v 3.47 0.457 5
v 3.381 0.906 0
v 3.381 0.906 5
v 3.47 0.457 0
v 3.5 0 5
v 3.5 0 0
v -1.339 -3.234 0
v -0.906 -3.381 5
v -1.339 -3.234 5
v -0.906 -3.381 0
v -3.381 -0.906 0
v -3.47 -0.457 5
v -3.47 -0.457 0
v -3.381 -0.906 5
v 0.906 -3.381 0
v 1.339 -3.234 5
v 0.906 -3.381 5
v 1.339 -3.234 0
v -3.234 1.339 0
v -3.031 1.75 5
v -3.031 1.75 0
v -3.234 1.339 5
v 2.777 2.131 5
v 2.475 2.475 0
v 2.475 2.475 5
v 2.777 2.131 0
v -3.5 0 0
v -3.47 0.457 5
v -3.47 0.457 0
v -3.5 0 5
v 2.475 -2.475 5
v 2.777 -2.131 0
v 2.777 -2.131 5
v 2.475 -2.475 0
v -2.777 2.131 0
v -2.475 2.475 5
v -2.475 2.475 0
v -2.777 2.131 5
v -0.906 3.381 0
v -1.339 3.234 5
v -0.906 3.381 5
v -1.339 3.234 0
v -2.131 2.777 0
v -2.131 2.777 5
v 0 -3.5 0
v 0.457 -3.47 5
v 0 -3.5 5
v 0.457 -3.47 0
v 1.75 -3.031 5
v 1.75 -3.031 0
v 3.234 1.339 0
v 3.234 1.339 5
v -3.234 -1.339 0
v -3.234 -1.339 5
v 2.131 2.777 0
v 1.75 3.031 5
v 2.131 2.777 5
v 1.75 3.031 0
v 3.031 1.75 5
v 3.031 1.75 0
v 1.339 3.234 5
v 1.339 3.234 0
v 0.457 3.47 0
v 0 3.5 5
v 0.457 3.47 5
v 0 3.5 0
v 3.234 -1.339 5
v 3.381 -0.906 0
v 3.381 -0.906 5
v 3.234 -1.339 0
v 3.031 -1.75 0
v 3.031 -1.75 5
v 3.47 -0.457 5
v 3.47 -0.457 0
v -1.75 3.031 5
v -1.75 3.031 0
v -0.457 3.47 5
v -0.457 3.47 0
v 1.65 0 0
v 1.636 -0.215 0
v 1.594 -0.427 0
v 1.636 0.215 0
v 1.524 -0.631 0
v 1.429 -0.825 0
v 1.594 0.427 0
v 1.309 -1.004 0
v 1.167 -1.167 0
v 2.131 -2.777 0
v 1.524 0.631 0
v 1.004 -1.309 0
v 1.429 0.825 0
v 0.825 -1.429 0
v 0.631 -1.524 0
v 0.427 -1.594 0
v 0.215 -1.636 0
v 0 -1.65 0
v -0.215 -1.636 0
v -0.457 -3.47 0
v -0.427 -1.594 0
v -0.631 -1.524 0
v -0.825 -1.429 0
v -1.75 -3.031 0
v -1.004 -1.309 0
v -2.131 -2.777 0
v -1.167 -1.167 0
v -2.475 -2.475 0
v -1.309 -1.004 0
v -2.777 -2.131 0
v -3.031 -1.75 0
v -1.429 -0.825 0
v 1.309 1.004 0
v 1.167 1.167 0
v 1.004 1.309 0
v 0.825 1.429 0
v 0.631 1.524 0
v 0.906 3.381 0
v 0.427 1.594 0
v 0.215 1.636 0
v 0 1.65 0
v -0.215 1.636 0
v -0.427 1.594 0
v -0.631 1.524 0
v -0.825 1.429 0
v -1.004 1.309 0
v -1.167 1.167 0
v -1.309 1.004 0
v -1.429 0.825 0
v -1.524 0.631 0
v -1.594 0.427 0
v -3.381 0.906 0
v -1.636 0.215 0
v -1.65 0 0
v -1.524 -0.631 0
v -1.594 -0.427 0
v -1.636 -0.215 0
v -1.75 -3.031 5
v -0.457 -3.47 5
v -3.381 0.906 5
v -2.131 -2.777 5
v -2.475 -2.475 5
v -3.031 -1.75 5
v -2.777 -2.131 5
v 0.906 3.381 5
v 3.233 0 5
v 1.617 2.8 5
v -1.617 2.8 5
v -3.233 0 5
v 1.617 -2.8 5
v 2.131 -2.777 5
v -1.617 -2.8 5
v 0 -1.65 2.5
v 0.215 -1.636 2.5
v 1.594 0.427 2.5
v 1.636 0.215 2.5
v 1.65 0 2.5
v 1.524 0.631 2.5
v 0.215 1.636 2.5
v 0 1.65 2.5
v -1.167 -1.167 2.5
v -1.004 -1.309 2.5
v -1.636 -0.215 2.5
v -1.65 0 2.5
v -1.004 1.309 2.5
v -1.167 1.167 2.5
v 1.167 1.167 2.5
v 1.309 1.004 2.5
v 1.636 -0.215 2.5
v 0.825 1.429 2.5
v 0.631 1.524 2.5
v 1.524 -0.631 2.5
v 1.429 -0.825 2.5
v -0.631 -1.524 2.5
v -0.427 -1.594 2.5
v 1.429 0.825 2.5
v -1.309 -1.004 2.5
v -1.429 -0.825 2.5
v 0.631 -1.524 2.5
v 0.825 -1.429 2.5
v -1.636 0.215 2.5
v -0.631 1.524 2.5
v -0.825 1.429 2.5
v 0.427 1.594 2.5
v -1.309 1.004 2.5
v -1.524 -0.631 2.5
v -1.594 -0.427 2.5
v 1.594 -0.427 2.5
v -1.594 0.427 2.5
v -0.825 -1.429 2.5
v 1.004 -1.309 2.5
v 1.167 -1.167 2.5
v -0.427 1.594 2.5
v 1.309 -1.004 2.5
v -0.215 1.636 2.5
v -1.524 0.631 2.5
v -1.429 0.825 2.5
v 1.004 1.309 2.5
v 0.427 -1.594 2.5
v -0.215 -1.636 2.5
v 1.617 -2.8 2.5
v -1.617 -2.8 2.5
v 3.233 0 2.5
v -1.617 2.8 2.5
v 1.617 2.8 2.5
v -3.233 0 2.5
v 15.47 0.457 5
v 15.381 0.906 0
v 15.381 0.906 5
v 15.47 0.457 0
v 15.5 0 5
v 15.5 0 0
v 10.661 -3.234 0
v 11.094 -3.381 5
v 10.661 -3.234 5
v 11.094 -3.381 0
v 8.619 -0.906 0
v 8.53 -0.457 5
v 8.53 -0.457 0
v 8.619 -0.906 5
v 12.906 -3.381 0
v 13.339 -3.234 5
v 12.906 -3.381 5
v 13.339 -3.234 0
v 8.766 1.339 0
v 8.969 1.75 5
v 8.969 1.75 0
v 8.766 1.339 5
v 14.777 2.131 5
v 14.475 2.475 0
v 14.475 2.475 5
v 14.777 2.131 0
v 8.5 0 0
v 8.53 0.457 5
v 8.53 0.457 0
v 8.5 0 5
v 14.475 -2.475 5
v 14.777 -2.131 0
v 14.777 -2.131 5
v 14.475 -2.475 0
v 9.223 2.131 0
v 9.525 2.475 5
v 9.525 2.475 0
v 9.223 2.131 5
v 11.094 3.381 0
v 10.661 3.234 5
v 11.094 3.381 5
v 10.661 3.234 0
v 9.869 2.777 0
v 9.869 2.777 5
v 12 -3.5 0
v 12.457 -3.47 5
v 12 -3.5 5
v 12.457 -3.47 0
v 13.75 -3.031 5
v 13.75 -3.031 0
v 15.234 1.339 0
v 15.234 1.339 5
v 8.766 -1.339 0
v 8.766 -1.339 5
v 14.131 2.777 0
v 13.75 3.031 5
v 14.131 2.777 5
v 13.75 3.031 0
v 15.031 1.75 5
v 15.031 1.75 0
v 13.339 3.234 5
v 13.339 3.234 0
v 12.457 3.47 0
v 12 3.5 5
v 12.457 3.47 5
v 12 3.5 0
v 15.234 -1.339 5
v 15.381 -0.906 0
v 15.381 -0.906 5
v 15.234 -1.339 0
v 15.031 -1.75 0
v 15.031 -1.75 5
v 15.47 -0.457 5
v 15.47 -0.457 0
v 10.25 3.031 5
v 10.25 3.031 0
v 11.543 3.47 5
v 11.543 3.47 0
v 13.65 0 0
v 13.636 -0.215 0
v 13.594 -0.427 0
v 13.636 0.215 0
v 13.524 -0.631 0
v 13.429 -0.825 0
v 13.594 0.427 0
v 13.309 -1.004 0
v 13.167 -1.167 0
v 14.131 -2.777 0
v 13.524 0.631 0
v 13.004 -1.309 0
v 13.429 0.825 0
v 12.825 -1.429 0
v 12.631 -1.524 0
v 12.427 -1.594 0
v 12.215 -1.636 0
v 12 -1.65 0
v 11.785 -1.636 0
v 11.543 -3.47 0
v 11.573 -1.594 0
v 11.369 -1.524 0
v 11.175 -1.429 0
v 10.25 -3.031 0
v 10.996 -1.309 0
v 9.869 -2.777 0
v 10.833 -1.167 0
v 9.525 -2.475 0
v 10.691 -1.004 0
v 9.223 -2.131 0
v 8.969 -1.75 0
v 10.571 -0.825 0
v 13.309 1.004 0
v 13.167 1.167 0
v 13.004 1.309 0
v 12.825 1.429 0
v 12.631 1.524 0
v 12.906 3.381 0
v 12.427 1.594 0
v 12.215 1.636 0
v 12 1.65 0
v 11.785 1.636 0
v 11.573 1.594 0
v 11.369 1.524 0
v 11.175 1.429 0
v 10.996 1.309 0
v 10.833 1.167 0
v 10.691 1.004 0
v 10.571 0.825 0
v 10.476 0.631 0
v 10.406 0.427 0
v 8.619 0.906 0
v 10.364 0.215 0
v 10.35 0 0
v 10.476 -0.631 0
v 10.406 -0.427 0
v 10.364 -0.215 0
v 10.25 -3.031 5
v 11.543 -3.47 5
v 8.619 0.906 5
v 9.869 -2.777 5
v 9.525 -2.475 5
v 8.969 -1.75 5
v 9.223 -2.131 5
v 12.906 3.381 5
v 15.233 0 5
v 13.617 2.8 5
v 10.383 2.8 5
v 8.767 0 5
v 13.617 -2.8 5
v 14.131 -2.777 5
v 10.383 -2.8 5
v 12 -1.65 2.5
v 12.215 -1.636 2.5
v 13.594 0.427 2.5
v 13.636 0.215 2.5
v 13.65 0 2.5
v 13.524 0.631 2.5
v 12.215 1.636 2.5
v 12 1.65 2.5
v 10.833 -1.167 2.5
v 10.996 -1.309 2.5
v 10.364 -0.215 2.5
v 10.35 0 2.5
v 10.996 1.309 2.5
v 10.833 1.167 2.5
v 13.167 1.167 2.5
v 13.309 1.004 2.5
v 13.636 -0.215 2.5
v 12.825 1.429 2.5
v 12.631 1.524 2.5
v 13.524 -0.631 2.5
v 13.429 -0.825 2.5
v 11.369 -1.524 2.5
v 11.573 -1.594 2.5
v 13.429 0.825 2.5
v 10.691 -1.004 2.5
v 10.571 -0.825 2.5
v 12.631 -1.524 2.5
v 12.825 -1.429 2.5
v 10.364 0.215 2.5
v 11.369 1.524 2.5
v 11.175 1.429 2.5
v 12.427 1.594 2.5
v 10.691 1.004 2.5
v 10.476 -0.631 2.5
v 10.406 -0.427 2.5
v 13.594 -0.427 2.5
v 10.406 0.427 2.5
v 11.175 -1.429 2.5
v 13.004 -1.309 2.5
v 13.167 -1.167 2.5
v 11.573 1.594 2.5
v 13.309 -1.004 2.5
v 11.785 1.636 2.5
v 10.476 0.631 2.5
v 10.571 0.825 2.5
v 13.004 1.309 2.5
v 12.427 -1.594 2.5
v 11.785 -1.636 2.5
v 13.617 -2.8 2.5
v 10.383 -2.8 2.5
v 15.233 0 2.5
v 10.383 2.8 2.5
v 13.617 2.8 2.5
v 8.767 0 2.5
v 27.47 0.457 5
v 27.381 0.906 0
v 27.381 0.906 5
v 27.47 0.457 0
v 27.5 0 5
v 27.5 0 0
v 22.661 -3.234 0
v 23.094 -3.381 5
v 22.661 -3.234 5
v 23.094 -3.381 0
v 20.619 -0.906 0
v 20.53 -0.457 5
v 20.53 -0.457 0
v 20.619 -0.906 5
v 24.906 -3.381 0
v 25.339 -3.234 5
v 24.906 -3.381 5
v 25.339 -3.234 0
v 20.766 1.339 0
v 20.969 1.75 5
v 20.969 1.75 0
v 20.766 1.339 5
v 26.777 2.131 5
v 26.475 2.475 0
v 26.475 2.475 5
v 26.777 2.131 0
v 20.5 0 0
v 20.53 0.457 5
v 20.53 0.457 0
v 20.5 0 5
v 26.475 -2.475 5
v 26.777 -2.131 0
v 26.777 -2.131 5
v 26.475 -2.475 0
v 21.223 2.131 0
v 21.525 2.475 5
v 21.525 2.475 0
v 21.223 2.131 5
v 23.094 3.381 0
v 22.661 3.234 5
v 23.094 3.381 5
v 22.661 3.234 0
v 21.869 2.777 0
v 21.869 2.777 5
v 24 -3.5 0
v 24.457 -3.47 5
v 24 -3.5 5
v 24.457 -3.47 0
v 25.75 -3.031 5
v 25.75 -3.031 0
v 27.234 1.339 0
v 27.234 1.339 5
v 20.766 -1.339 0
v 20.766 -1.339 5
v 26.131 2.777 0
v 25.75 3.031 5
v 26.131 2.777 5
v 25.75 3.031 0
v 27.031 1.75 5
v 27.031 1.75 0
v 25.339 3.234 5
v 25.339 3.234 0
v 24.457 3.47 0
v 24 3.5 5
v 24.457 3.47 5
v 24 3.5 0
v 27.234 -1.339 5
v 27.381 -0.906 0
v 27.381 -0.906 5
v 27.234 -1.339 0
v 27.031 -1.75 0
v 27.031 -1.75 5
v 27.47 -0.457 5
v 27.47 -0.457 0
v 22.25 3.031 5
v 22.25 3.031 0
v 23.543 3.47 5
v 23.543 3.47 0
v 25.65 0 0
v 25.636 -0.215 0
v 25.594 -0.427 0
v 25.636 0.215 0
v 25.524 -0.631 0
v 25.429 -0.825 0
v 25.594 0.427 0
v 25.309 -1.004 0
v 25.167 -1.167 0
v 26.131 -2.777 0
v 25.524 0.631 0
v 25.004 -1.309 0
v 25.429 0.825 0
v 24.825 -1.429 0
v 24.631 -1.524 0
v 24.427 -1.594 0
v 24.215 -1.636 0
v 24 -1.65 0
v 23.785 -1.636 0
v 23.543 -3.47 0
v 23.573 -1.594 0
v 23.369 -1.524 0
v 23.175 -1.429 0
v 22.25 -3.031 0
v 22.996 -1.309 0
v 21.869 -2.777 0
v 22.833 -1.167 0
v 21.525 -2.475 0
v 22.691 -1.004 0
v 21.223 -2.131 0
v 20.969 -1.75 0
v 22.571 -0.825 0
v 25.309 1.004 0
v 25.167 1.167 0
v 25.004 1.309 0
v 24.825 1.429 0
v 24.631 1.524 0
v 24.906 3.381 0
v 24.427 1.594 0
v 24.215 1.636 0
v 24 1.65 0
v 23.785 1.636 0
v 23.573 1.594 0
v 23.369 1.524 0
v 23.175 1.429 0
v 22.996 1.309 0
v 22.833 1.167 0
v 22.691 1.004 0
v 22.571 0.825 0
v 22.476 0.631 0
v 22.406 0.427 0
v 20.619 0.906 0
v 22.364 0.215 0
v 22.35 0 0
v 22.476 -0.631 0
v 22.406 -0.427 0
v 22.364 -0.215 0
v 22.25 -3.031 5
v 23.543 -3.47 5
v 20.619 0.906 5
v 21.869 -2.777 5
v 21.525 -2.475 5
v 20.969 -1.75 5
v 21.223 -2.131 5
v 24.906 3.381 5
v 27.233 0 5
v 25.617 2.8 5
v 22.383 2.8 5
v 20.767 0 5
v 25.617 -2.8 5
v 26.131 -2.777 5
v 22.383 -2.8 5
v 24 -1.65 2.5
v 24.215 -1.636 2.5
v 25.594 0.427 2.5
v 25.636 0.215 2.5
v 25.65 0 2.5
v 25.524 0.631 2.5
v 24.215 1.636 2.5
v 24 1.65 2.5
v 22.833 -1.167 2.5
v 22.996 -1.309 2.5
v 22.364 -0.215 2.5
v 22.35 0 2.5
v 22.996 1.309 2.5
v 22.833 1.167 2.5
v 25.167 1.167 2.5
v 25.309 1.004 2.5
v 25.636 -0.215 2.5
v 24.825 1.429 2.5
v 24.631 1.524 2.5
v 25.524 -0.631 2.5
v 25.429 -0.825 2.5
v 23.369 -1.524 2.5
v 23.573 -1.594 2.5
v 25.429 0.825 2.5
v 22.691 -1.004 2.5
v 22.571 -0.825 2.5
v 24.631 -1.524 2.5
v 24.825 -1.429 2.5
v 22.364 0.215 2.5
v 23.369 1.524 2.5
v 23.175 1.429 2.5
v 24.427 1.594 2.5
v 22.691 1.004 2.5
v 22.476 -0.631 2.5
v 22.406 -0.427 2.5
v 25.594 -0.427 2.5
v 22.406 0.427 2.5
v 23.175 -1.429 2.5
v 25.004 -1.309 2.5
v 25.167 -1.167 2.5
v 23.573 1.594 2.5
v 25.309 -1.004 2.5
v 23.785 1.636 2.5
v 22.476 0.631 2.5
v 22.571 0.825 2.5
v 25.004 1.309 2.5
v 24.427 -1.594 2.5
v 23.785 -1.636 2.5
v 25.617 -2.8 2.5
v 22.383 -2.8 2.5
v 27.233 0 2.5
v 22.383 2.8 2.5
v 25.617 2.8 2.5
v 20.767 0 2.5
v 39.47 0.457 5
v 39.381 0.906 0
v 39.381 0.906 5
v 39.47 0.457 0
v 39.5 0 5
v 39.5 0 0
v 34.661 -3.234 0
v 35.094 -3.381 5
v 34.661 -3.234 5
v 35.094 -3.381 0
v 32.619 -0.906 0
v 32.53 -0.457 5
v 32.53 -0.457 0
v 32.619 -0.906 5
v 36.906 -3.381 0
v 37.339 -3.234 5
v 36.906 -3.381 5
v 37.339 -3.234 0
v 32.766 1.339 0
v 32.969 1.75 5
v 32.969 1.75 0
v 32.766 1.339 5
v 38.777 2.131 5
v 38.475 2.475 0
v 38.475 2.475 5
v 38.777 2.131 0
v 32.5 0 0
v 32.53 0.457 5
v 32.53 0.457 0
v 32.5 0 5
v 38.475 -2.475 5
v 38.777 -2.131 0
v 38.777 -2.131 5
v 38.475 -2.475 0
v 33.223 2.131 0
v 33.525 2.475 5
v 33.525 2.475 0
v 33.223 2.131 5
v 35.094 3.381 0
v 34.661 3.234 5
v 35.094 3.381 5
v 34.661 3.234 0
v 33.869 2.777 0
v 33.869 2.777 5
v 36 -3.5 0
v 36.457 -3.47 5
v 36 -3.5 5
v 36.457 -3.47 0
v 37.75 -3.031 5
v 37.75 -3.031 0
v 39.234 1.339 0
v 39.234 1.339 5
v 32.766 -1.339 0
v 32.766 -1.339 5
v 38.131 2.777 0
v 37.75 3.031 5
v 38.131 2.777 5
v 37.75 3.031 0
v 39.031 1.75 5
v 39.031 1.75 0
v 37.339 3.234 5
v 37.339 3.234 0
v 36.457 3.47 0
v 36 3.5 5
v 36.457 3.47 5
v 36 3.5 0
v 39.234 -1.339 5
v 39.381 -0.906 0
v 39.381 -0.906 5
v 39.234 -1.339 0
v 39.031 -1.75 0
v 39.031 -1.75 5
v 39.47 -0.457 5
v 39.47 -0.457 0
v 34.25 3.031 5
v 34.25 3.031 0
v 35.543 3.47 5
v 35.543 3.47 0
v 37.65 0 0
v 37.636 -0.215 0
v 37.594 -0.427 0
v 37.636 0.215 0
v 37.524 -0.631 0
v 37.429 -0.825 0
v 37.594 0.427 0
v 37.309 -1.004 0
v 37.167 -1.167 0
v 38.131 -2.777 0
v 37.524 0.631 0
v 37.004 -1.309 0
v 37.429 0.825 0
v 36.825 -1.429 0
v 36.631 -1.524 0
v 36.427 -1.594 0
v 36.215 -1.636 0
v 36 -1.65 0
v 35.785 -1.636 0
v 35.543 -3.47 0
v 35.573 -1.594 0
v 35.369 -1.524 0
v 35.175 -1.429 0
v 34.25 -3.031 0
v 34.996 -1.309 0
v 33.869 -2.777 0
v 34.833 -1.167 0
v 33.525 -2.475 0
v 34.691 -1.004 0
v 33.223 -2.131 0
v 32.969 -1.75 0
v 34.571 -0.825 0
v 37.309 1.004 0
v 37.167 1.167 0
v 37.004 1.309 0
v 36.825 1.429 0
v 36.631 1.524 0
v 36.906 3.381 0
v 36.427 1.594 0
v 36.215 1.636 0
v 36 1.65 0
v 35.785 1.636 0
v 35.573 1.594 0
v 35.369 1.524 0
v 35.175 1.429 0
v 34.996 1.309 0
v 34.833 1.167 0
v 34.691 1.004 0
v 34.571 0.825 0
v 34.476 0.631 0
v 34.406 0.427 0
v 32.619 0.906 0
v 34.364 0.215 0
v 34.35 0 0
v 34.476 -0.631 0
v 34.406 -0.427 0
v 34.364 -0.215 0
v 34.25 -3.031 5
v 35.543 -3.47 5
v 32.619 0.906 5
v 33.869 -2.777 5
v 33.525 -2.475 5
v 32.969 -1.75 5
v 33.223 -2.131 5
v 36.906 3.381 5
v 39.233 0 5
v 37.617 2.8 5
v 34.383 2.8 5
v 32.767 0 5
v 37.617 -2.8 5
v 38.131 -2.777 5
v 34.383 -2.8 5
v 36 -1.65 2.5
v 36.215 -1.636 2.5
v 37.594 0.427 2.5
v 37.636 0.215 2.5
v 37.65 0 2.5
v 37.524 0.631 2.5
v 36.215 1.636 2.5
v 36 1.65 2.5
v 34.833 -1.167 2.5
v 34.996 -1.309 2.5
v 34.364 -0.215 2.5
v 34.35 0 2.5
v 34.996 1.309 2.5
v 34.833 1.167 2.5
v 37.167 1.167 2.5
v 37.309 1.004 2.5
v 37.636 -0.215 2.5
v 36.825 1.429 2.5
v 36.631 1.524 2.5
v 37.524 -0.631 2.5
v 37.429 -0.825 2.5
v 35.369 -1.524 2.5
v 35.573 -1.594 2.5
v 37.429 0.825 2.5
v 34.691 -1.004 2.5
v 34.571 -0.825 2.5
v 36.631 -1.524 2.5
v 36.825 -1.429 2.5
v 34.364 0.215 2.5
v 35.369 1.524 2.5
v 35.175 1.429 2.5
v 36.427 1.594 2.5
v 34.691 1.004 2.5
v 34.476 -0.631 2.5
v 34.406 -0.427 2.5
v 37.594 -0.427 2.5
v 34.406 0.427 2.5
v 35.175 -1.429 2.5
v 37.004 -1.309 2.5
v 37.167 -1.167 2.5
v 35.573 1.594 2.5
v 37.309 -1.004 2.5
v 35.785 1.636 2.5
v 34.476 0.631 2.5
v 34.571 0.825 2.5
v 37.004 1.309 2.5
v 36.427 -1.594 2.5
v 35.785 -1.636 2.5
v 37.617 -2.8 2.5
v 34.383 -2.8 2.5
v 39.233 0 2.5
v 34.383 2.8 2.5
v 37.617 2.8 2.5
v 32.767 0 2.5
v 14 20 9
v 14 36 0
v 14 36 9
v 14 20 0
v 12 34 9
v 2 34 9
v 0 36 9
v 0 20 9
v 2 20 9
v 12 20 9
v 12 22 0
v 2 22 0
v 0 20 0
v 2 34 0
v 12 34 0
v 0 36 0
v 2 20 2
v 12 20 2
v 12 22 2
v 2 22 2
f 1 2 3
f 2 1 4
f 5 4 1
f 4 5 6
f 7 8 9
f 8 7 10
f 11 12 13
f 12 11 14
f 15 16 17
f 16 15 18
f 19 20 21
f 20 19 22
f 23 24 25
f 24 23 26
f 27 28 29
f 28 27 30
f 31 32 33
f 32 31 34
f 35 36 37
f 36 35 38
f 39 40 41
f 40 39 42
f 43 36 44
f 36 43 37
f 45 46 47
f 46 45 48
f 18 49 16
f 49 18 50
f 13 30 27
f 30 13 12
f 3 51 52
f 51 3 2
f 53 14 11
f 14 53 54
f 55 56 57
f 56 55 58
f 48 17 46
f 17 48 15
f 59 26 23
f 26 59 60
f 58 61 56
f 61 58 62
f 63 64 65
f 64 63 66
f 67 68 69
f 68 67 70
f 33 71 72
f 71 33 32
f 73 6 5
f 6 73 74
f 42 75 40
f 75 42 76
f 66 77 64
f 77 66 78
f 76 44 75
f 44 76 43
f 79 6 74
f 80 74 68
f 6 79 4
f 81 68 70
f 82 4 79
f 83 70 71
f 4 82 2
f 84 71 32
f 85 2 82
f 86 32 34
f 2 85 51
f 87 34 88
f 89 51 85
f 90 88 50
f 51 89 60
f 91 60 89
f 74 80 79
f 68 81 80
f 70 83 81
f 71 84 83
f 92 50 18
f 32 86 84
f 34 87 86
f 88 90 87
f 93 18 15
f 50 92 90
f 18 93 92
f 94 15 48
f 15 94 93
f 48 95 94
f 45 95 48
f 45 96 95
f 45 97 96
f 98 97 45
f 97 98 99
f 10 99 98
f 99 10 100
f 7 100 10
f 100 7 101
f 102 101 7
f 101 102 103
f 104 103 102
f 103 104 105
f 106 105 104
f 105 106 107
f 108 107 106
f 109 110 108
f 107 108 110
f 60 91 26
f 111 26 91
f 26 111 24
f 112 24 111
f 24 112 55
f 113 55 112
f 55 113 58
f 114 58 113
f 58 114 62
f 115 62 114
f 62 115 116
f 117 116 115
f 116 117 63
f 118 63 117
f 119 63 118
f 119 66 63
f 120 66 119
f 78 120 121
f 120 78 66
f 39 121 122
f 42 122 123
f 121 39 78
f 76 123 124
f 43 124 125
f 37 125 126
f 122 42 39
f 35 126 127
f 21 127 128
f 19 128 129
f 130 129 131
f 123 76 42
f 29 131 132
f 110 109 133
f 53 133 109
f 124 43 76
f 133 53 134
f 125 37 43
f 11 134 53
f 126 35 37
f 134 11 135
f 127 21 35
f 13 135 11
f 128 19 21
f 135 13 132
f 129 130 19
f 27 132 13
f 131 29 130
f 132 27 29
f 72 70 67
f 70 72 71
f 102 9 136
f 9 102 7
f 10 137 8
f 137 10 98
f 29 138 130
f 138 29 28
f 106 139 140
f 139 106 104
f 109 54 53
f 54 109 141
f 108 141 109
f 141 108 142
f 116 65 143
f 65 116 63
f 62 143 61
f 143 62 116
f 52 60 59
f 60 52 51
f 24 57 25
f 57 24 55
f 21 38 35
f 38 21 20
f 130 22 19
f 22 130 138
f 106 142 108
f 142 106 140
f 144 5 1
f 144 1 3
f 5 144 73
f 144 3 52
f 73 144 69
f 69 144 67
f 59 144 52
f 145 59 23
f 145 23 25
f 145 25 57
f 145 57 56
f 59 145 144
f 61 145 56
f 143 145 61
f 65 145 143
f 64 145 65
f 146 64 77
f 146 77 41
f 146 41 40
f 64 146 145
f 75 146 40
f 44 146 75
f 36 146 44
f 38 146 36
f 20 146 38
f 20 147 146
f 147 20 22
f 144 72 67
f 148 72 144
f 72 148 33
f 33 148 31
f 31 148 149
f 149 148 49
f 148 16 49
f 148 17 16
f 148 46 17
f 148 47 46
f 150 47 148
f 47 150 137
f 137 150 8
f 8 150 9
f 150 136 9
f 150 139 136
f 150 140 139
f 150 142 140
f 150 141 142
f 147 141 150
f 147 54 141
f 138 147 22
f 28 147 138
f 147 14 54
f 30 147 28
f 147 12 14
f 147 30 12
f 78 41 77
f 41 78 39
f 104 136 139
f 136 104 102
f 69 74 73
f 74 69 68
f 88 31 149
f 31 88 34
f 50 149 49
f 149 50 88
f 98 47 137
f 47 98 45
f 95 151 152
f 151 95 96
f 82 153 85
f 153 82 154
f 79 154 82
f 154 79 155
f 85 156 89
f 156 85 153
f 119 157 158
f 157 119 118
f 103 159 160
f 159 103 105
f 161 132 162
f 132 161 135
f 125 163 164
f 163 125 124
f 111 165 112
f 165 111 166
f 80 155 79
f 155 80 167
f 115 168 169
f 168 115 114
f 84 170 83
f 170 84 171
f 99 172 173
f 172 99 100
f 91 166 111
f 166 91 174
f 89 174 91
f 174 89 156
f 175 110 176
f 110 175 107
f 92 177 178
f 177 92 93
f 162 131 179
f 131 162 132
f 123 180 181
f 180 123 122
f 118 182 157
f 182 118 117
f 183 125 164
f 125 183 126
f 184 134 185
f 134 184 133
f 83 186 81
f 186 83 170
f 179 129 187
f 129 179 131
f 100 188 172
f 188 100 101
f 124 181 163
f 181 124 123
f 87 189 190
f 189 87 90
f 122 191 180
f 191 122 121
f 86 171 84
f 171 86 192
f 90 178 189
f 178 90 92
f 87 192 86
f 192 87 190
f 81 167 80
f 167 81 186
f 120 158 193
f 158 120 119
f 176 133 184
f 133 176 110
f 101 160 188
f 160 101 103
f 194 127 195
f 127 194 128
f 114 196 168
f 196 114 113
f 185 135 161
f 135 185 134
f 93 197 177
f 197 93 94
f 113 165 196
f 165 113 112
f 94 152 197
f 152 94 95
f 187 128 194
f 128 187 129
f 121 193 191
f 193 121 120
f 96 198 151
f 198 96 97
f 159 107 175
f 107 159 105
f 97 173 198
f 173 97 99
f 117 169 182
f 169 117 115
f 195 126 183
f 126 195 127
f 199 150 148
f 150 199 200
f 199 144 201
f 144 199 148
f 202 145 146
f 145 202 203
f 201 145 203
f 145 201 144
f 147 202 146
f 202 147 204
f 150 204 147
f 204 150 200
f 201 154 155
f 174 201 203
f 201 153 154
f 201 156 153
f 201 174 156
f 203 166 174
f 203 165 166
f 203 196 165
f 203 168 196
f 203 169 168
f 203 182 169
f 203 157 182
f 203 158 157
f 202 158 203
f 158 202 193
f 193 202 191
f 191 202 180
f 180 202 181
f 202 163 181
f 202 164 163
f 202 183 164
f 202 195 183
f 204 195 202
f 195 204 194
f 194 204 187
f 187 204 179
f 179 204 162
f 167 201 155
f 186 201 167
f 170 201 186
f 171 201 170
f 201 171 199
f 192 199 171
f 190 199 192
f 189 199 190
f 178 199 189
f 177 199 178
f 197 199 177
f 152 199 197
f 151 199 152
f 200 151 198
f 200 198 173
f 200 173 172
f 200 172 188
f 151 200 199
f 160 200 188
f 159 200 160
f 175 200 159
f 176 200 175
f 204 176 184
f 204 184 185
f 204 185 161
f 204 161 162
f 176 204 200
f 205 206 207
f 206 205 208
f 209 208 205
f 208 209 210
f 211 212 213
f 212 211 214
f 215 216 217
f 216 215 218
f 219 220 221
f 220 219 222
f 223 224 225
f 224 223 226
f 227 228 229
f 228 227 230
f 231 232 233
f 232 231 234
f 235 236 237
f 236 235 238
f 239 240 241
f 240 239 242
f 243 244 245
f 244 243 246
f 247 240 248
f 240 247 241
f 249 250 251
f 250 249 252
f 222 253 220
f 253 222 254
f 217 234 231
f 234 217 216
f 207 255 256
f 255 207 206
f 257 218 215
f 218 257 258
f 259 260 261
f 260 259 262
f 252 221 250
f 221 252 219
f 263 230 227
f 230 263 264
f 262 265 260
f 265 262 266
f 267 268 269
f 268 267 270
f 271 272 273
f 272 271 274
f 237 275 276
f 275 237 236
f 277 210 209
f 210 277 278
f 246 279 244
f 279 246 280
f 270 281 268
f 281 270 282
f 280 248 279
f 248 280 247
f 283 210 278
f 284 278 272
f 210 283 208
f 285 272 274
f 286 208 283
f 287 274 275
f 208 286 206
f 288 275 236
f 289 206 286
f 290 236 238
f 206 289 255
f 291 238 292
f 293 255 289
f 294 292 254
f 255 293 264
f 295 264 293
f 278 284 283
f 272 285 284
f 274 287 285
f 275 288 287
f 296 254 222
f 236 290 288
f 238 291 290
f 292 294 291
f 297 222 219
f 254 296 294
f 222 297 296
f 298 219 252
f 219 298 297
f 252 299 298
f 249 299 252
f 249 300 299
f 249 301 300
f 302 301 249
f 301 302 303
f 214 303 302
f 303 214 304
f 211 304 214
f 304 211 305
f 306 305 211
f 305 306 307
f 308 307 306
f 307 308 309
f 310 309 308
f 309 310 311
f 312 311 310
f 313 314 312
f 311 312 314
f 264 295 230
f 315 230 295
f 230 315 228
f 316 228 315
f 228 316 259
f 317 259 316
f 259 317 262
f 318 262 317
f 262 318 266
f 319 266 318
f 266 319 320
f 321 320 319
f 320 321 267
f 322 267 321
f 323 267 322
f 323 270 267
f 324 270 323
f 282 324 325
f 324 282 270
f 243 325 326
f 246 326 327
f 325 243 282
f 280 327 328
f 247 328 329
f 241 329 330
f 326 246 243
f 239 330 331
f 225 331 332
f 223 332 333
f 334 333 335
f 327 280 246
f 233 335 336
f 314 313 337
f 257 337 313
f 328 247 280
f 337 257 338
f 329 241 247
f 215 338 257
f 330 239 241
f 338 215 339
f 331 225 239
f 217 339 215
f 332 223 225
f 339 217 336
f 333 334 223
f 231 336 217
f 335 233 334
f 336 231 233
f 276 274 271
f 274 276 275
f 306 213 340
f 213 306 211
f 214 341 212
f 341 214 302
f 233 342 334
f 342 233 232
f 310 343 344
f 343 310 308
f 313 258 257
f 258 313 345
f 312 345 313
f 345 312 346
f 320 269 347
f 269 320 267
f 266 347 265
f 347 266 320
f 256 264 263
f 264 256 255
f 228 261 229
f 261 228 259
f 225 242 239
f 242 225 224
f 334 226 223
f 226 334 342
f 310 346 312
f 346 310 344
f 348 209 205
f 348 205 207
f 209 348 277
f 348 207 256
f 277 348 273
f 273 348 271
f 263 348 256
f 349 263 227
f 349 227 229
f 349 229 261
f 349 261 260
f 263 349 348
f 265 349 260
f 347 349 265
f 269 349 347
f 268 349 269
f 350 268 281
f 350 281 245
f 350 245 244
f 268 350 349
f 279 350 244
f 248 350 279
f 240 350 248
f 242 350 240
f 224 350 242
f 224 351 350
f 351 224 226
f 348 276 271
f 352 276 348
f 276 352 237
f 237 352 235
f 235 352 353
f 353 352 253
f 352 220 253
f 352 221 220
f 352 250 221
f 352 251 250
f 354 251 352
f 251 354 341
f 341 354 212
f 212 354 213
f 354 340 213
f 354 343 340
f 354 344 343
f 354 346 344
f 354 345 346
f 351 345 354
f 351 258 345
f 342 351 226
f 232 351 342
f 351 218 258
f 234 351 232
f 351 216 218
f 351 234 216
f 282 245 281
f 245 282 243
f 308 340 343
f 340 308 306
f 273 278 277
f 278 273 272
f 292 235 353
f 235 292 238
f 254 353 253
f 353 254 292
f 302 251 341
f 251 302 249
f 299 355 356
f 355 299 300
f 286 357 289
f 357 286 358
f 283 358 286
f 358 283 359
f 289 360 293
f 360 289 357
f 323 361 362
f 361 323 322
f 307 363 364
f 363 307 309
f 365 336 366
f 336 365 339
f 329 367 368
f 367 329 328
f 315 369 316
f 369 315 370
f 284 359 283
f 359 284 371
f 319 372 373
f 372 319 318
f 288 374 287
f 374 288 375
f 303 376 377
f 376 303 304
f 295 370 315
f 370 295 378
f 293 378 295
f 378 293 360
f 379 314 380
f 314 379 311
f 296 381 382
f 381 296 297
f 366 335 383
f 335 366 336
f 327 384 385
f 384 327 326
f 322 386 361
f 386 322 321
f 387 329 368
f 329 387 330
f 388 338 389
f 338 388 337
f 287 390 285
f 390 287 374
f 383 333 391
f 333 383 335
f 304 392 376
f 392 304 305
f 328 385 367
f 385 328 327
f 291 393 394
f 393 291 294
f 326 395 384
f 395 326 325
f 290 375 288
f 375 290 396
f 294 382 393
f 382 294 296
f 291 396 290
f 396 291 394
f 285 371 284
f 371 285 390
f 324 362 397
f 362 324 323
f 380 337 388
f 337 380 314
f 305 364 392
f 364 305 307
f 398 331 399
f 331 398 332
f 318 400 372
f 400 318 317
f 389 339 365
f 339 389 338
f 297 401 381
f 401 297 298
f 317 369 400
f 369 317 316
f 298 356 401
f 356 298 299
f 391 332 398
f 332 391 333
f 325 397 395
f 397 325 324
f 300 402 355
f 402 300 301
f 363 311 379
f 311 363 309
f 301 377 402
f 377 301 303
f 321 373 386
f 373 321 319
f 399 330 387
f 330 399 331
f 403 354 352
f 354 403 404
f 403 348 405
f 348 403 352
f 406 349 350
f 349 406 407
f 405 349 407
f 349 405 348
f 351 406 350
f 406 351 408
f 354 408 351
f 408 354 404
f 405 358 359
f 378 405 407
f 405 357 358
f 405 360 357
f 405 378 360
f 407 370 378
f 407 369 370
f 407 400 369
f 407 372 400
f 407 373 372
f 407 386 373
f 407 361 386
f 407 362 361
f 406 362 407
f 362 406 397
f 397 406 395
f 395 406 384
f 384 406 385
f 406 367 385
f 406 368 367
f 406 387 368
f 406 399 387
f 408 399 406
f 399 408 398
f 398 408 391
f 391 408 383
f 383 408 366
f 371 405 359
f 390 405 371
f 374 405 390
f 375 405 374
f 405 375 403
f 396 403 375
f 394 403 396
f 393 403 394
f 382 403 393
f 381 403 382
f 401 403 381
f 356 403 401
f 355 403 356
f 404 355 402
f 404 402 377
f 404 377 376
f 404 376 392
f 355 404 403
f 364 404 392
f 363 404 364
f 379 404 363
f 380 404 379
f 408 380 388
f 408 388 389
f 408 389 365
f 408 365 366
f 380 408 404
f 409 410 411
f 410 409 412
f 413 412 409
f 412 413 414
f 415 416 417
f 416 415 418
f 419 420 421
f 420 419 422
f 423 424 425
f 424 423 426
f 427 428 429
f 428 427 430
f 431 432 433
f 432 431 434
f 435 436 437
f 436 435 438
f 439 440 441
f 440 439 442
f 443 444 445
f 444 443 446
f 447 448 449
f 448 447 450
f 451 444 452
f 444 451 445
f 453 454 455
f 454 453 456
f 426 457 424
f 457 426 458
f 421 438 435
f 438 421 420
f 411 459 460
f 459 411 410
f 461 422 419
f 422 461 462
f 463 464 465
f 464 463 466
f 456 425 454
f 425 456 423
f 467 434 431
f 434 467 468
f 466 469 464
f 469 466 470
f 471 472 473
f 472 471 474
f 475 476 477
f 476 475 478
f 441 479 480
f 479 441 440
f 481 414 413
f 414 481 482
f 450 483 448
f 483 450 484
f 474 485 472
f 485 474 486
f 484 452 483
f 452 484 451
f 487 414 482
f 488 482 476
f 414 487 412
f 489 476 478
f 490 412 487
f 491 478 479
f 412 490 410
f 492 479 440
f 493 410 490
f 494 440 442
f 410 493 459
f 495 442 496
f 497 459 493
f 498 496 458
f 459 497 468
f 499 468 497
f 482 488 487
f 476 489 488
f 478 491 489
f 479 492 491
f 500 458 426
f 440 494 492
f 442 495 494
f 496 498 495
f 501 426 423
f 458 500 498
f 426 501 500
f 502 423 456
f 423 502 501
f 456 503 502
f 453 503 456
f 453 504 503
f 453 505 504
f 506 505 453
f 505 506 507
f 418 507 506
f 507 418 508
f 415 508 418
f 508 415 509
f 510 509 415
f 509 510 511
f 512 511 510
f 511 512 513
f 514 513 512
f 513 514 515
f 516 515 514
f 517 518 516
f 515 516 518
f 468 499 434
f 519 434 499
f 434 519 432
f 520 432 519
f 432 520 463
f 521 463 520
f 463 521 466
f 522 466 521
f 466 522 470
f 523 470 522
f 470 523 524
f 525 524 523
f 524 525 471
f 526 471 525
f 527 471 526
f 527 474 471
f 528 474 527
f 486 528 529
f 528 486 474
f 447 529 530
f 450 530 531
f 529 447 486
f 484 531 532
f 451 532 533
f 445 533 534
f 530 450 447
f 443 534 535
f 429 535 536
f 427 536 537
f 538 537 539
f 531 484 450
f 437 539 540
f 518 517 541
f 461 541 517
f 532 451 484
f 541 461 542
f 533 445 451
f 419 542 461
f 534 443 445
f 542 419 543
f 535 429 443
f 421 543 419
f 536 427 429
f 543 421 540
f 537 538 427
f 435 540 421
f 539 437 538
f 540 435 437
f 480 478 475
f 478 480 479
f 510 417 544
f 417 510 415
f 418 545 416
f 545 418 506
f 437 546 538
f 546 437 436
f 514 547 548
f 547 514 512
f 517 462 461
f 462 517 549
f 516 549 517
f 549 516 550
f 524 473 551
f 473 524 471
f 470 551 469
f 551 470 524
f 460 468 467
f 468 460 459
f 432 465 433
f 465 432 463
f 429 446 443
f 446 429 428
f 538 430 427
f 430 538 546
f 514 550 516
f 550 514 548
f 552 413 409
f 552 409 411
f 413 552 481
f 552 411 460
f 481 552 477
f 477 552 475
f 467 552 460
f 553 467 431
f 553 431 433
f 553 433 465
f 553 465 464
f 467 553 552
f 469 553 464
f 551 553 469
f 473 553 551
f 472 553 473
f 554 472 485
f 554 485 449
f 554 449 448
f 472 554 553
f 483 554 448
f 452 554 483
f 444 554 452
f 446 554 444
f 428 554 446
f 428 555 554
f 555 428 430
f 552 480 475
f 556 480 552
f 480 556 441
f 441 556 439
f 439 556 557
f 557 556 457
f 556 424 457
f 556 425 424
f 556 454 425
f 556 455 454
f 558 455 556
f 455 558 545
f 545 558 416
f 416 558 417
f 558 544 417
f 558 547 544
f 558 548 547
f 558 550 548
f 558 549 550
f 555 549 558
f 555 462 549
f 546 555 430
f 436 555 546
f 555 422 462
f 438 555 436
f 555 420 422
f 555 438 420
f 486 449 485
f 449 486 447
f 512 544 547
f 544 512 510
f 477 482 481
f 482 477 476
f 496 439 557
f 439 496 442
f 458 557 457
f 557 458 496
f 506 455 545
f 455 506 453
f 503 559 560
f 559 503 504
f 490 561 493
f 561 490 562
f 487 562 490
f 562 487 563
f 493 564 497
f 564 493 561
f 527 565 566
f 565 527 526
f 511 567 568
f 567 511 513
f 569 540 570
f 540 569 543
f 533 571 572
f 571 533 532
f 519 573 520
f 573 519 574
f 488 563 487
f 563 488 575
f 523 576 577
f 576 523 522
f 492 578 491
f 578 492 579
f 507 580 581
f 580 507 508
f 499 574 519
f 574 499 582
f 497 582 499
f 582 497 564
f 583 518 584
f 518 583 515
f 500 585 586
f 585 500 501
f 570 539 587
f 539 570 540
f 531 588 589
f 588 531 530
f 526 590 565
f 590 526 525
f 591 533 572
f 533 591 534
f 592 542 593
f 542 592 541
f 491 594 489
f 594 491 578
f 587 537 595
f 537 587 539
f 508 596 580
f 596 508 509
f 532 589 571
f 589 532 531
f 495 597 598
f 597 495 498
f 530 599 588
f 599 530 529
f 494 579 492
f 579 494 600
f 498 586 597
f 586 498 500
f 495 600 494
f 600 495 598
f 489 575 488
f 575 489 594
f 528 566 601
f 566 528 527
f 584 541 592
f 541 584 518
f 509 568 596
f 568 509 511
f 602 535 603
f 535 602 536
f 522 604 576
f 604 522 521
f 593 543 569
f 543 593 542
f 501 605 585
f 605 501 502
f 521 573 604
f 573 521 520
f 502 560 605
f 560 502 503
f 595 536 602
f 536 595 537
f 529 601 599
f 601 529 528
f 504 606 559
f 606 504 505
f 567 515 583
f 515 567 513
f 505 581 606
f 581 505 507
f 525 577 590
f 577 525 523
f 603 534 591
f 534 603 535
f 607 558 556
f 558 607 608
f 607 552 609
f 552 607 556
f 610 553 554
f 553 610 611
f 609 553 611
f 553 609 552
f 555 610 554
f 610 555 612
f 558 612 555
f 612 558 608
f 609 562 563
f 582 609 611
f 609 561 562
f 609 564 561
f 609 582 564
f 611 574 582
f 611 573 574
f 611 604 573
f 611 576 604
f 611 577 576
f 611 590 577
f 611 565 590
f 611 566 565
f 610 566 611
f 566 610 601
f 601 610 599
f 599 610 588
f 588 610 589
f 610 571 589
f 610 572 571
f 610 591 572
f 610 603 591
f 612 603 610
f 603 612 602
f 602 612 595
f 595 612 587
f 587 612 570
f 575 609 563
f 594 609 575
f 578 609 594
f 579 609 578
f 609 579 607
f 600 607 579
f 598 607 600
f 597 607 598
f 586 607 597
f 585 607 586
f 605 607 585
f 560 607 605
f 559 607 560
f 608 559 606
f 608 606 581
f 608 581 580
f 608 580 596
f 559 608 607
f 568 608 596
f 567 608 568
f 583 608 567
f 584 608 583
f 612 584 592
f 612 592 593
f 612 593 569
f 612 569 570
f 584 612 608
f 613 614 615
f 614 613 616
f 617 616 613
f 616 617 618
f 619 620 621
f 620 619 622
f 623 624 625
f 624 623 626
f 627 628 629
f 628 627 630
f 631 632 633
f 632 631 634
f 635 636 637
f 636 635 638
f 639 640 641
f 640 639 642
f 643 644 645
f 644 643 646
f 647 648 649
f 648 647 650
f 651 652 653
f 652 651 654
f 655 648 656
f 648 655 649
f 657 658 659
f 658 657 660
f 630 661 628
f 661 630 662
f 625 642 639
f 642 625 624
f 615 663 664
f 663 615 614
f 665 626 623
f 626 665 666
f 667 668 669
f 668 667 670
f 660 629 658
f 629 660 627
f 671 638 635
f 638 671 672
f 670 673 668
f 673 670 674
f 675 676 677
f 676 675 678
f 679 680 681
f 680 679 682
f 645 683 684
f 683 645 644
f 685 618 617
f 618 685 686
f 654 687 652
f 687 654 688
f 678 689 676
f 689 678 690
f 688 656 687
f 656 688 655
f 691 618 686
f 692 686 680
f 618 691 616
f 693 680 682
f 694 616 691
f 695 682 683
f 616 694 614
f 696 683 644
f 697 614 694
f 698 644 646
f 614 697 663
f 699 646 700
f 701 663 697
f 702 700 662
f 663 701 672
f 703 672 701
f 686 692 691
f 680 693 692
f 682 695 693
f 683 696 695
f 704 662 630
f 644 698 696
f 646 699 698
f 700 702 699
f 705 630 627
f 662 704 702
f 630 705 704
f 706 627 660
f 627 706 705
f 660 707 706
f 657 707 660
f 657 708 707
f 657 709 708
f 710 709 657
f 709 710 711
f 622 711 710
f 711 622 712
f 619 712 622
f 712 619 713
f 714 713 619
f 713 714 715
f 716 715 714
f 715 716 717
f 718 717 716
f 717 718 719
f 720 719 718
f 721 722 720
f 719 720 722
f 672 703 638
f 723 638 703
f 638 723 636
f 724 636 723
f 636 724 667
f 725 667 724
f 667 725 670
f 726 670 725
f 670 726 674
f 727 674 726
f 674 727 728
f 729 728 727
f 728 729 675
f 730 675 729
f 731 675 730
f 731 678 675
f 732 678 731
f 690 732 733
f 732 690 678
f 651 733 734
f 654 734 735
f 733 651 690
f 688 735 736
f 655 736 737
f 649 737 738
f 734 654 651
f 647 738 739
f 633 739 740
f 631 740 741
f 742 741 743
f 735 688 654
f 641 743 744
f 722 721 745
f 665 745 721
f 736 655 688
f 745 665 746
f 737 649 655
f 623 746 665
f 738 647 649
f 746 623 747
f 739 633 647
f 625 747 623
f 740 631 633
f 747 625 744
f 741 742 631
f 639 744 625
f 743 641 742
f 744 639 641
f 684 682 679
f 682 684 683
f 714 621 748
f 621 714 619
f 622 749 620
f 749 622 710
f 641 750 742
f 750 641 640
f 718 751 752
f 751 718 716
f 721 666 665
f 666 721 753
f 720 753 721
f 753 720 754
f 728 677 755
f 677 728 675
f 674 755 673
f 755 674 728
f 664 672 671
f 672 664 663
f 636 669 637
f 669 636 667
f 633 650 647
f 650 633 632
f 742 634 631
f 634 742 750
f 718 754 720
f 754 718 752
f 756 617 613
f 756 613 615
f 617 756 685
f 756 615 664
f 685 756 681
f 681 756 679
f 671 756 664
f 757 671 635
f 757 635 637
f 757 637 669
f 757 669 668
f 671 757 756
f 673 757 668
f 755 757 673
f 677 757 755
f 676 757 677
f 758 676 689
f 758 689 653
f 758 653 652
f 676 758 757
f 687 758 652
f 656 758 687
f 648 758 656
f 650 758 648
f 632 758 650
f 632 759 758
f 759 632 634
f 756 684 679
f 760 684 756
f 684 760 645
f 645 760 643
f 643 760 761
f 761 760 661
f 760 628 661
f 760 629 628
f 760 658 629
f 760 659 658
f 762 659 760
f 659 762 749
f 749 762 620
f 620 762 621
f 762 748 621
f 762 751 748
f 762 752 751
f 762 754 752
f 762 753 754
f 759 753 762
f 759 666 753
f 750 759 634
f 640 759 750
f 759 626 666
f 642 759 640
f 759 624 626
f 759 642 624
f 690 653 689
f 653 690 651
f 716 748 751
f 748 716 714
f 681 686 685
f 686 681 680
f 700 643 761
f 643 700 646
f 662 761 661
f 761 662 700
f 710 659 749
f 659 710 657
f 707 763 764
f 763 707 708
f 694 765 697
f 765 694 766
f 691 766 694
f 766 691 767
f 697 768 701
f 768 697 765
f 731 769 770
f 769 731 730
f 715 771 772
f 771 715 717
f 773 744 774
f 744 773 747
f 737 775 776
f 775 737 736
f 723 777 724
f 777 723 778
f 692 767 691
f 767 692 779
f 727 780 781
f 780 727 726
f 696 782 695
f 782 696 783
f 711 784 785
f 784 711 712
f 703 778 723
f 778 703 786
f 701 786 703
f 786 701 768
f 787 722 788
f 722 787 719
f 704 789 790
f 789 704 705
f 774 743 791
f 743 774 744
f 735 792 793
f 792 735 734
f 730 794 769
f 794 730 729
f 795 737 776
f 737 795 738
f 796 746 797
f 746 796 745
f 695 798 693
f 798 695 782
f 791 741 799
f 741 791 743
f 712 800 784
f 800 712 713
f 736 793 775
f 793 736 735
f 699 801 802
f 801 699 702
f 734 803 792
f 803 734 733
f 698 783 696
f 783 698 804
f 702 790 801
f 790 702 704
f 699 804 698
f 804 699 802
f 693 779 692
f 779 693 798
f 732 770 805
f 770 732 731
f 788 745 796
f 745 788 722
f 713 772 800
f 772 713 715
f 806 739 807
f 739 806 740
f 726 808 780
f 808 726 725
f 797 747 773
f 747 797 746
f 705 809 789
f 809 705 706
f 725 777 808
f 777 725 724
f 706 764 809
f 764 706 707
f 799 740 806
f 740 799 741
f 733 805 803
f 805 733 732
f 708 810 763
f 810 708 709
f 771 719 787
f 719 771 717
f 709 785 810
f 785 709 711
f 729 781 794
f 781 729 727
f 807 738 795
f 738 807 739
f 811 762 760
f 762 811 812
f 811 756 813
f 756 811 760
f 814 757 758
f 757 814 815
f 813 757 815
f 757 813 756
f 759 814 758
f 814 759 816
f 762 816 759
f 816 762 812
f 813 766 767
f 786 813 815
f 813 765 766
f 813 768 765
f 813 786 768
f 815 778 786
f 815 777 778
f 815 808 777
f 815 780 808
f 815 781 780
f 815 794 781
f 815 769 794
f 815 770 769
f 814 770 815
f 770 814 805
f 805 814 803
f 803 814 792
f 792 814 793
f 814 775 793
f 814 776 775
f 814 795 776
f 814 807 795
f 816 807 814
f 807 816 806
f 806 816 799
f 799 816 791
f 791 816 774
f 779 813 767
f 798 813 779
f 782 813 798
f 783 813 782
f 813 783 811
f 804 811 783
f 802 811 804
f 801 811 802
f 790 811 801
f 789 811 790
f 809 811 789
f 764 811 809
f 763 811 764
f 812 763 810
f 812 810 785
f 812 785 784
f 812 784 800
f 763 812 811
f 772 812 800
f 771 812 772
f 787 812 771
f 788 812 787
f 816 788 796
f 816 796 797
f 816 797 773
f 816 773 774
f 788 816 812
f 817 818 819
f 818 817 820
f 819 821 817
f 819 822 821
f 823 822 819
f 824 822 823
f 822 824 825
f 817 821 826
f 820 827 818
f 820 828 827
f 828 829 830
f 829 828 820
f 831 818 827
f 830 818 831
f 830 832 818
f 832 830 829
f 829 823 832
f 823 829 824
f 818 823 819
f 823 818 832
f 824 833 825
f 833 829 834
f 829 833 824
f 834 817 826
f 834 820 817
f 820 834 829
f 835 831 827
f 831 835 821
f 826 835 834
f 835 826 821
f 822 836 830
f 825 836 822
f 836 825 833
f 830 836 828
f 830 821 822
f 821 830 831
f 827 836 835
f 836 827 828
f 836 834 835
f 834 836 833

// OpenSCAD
// file: params.scad
// params.scad — 단일 진실 원천 (모든 .scad 가 include)
//
// 변경 시 다른 파일 안 건드려도 됨. 측정값이 다르면 여기만 수정.
// 단위: mm.

// ────────────────────────────────────────────────────────────────
// HSP 94118 차체 (1/10 short course) — 사용자 측정값으로 보정 권장
// ────────────────────────────────────────────────────────────────
// 차체에 박혀 있는 4개의 body post 가 deck 의 mounting feet 와 맞물림.
// 자기 차체 분해해서 자/캘리퍼로 측정해서 다음 두 값을 갱신.
chassis_post_spacing_x = 215;   // 앞뒤 post 간 거리
chassis_post_spacing_y = 170;   // 좌우 post 간 거리
chassis_post_diameter  = 6;     // body post 굵기
chassis_post_clip_d    = 1.5;   // body clip 핀 굵기 (수평 관통)
chassis_post_height    = 80;    // chassis 윗면 ~ post 끝 높이

// ────────────────────────────────────────────────────────────────
// 데크 플레이트
// ────────────────────────────────────────────────────────────────
deck_thickness    = 4;          // 4mm PLA = 충분한 강성
deck_margin_x     = 15;         // post 바깥쪽 여유 (앞뒤)
deck_margin_y     = 10;         // post 바깥쪽 여유 (좌우)
deck_corner_r     = 8;          // 모서리 둥글기

deck_size_x = chassis_post_spacing_x + 2 * deck_margin_x;   // 245
deck_size_y = chassis_post_spacing_y + 2 * deck_margin_y;   // 190

// 데크 mounting foot — body post 가 끼는 구멍 + body clip 슬롯
foot_clearance     = 0.4;       // post 와 hole 간격 (PLA 수축 보정)
foot_hole_d        = chassis_post_diameter + foot_clearance;
foot_clip_slot_w   = chassis_post_clip_d + 0.4;
foot_clip_slot_h   = 2.0;       // 슬롯 세로 길이 (post 위아래 위치 조정 여유)

// ────────────────────────────────────────────────────────────────
// Jetson Orin Nano Super Dev Kit
// ────────────────────────────────────────────────────────────────
// 캐리어 보드 (J401/J501 호환 dev kit 기준).
jetson_pcb_x       = 100;
jetson_pcb_y       = 79;
jetson_pcb_z       = 1.6;       // PCB 두께
jetson_hole_dx     = 86;        // 4 모서리 M3 홀 가로 간격
jetson_hole_dy     = 58;        // 세로 간격
jetson_hole_d      = 3.3;       // M3 통과
jetson_standoff_h  = 6;         // PCB 바닥 ~ deck 사이 여유 (heatsink 고려해 deck 윗면에 설치)
jetson_total_z     = 30;        // PCB + heatsink/fan 전체 높이 (충돌 회피용)

// ────────────────────────────────────────────────────────────────
// STM32 NUCLEO-H753ZI
// ────────────────────────────────────────────────────────────────
nucleo_pcb_x       = 140;
nucleo_pcb_y       = 70;
nucleo_pcb_z       = 1.6;
// NUCLEO 보드 4 모서리 M3 마운팅 홀 — 데이터시트 UM2407 figure 6 참조.
// 측정값과 다르면 보정.
nucleo_hole_dx     = 130;
nucleo_hole_dy     = 60;
nucleo_hole_d      = 3.3;
nucleo_standoff_h  = 5;
nucleo_total_z     = 18;        // ST-LINK 부품 포함 위쪽 높이

// ────────────────────────────────────────────────────────────────
// IMX219 카메라 모듈 (Arducam/Waveshare 표준 보드)
// ────────────────────────────────────────────────────────────────
imx219_pcb_x       = 25;
imx219_pcb_y       = 24;
imx219_pcb_z       = 1.0;
imx219_hole_dx     = 21;
imx219_hole_dy     = 12.5;
imx219_hole_d      = 2.4;       // M2 통과 (2.0 + 0.4 클리어런스)
imx219_lens_offset_y = 2.5;     // 렌즈 중심이 PCB 중심에서 살짝 위
imx219_lens_d      = 7.0;       // 렌즈 마운트 외경

// 스테레오 baseline (사용자 선택: 80mm)
camera_baseline    = 80;
camera_tilt_deg    = 8;         // 도로 8° 아래로 향함 (기본값, 슬롯으로 ±15° 조정)

// ────────────────────────────────────────────────────────────────
// 카메라 마스트 (전방 수직 봉)
// ────────────────────────────────────────────────────────────────
mast_height        = 60;        // deck 위에서 60mm
mast_base_thickness = 4;
mast_arm_thickness = 3;
mast_arm_width     = 8;

// ────────────────────────────────────────────────────────────────
// 배터리 (LiPo 2S, 일반적인 5000mAh hard-case 가정)
// ────────────────────────────────────────────────────────────────
battery_x = 140;
battery_y = 47;
battery_z = 25;
battery_strap_w = 12;           // 벨크로 스트랩 슬롯 너비

// ────────────────────────────────────────────────────────────────
// 커버 셸 (RC 바디 대체)
// ────────────────────────────────────────────────────────────────
cover_thickness    = 2.4;       // 얇게 (가벼움 + 빠른 출력)
cover_height       = 95;        // deck 위 95mm — Jetson + 여유
cover_overhang     = 5;         // deck 가장자리 바깥으로 빠지는 양
cover_vent_slot_w  = 4;
cover_vent_slot_l  = 30;

// ────────────────────────────────────────────────────────────────
// 공통
// ────────────────────────────────────────────────────────────────
$fn = 48;                       // 렌더 해상도
m3_nut_w           = 5.6;       // M3 너트 평면 거리 (육각 across-flats)
m3_nut_h           = 2.5;       // M3 너트 두께
m3_head_d          = 6.0;       // M3 캡헤드 외경
m3_head_h          = 3.0;
// main file
// stm32_clip.scad — STM32 NUCLEO-H753ZI standoff + USB 커넥터 보호 클립.
//
// NUCLEO 의 Mini-USB (ST-LINK) 커넥터에 케이블이 자주 빠지면 USART3 RX/TX 가 쉽게 끊김.
// 작은 ㄷ자 클립이 USB 케이블을 잡아주는 역할.

include <params.scad>;

module standoff(h, outer_d=7, hole_d=nucleo_hole_d) {
    difference() {
        cylinder(d=outer_d, h=h);
        translate([0, 0, -0.1])
            cylinder(d=hole_d, h=h + 0.2);
        translate([0, 0, h - m3_nut_h])
            cylinder(d=m3_nut_w / cos(30), h=m3_nut_h + 0.1, $fn=6);
    }
}

module usb_strain_relief() {
    // ST-LINK USB 커넥터 옆에 붙여 케이블을 끼워 두는 ㄷ자 클립.
    // Mini-USB B 플러그 외형 ~9 × 7mm. 살짝 여유.
    body_x = 14;
    body_y = 16;
    body_z = 9;
    wall = 2;

    difference() {
        cube([body_x, body_y, body_z]);
        translate([wall, wall, -0.1])
            cube([body_x - 2*wall, body_y - 2*wall, body_z + 0.2]);
        // 입구 (케이블이 들어가는 쪽)
        translate([wall, -0.1, 2])
            cube([body_x - 2*wall, wall + 0.2, body_z]);
        // 데크 고정용 M3 홀 1개 (밑면)
        translate([body_x/2, body_y/2, -0.1])
            cylinder(d=jetson_hole_d, h=body_z + 0.2);
    }
}

// 4개 standoff + 1개 strain relief 한꺼번에 출력
for (i = [0:3])
    translate([i * 12, 0, 0])
        standoff(nucleo_standoff_h);

translate([0, 20, 0])
    usb_strain_relief();
